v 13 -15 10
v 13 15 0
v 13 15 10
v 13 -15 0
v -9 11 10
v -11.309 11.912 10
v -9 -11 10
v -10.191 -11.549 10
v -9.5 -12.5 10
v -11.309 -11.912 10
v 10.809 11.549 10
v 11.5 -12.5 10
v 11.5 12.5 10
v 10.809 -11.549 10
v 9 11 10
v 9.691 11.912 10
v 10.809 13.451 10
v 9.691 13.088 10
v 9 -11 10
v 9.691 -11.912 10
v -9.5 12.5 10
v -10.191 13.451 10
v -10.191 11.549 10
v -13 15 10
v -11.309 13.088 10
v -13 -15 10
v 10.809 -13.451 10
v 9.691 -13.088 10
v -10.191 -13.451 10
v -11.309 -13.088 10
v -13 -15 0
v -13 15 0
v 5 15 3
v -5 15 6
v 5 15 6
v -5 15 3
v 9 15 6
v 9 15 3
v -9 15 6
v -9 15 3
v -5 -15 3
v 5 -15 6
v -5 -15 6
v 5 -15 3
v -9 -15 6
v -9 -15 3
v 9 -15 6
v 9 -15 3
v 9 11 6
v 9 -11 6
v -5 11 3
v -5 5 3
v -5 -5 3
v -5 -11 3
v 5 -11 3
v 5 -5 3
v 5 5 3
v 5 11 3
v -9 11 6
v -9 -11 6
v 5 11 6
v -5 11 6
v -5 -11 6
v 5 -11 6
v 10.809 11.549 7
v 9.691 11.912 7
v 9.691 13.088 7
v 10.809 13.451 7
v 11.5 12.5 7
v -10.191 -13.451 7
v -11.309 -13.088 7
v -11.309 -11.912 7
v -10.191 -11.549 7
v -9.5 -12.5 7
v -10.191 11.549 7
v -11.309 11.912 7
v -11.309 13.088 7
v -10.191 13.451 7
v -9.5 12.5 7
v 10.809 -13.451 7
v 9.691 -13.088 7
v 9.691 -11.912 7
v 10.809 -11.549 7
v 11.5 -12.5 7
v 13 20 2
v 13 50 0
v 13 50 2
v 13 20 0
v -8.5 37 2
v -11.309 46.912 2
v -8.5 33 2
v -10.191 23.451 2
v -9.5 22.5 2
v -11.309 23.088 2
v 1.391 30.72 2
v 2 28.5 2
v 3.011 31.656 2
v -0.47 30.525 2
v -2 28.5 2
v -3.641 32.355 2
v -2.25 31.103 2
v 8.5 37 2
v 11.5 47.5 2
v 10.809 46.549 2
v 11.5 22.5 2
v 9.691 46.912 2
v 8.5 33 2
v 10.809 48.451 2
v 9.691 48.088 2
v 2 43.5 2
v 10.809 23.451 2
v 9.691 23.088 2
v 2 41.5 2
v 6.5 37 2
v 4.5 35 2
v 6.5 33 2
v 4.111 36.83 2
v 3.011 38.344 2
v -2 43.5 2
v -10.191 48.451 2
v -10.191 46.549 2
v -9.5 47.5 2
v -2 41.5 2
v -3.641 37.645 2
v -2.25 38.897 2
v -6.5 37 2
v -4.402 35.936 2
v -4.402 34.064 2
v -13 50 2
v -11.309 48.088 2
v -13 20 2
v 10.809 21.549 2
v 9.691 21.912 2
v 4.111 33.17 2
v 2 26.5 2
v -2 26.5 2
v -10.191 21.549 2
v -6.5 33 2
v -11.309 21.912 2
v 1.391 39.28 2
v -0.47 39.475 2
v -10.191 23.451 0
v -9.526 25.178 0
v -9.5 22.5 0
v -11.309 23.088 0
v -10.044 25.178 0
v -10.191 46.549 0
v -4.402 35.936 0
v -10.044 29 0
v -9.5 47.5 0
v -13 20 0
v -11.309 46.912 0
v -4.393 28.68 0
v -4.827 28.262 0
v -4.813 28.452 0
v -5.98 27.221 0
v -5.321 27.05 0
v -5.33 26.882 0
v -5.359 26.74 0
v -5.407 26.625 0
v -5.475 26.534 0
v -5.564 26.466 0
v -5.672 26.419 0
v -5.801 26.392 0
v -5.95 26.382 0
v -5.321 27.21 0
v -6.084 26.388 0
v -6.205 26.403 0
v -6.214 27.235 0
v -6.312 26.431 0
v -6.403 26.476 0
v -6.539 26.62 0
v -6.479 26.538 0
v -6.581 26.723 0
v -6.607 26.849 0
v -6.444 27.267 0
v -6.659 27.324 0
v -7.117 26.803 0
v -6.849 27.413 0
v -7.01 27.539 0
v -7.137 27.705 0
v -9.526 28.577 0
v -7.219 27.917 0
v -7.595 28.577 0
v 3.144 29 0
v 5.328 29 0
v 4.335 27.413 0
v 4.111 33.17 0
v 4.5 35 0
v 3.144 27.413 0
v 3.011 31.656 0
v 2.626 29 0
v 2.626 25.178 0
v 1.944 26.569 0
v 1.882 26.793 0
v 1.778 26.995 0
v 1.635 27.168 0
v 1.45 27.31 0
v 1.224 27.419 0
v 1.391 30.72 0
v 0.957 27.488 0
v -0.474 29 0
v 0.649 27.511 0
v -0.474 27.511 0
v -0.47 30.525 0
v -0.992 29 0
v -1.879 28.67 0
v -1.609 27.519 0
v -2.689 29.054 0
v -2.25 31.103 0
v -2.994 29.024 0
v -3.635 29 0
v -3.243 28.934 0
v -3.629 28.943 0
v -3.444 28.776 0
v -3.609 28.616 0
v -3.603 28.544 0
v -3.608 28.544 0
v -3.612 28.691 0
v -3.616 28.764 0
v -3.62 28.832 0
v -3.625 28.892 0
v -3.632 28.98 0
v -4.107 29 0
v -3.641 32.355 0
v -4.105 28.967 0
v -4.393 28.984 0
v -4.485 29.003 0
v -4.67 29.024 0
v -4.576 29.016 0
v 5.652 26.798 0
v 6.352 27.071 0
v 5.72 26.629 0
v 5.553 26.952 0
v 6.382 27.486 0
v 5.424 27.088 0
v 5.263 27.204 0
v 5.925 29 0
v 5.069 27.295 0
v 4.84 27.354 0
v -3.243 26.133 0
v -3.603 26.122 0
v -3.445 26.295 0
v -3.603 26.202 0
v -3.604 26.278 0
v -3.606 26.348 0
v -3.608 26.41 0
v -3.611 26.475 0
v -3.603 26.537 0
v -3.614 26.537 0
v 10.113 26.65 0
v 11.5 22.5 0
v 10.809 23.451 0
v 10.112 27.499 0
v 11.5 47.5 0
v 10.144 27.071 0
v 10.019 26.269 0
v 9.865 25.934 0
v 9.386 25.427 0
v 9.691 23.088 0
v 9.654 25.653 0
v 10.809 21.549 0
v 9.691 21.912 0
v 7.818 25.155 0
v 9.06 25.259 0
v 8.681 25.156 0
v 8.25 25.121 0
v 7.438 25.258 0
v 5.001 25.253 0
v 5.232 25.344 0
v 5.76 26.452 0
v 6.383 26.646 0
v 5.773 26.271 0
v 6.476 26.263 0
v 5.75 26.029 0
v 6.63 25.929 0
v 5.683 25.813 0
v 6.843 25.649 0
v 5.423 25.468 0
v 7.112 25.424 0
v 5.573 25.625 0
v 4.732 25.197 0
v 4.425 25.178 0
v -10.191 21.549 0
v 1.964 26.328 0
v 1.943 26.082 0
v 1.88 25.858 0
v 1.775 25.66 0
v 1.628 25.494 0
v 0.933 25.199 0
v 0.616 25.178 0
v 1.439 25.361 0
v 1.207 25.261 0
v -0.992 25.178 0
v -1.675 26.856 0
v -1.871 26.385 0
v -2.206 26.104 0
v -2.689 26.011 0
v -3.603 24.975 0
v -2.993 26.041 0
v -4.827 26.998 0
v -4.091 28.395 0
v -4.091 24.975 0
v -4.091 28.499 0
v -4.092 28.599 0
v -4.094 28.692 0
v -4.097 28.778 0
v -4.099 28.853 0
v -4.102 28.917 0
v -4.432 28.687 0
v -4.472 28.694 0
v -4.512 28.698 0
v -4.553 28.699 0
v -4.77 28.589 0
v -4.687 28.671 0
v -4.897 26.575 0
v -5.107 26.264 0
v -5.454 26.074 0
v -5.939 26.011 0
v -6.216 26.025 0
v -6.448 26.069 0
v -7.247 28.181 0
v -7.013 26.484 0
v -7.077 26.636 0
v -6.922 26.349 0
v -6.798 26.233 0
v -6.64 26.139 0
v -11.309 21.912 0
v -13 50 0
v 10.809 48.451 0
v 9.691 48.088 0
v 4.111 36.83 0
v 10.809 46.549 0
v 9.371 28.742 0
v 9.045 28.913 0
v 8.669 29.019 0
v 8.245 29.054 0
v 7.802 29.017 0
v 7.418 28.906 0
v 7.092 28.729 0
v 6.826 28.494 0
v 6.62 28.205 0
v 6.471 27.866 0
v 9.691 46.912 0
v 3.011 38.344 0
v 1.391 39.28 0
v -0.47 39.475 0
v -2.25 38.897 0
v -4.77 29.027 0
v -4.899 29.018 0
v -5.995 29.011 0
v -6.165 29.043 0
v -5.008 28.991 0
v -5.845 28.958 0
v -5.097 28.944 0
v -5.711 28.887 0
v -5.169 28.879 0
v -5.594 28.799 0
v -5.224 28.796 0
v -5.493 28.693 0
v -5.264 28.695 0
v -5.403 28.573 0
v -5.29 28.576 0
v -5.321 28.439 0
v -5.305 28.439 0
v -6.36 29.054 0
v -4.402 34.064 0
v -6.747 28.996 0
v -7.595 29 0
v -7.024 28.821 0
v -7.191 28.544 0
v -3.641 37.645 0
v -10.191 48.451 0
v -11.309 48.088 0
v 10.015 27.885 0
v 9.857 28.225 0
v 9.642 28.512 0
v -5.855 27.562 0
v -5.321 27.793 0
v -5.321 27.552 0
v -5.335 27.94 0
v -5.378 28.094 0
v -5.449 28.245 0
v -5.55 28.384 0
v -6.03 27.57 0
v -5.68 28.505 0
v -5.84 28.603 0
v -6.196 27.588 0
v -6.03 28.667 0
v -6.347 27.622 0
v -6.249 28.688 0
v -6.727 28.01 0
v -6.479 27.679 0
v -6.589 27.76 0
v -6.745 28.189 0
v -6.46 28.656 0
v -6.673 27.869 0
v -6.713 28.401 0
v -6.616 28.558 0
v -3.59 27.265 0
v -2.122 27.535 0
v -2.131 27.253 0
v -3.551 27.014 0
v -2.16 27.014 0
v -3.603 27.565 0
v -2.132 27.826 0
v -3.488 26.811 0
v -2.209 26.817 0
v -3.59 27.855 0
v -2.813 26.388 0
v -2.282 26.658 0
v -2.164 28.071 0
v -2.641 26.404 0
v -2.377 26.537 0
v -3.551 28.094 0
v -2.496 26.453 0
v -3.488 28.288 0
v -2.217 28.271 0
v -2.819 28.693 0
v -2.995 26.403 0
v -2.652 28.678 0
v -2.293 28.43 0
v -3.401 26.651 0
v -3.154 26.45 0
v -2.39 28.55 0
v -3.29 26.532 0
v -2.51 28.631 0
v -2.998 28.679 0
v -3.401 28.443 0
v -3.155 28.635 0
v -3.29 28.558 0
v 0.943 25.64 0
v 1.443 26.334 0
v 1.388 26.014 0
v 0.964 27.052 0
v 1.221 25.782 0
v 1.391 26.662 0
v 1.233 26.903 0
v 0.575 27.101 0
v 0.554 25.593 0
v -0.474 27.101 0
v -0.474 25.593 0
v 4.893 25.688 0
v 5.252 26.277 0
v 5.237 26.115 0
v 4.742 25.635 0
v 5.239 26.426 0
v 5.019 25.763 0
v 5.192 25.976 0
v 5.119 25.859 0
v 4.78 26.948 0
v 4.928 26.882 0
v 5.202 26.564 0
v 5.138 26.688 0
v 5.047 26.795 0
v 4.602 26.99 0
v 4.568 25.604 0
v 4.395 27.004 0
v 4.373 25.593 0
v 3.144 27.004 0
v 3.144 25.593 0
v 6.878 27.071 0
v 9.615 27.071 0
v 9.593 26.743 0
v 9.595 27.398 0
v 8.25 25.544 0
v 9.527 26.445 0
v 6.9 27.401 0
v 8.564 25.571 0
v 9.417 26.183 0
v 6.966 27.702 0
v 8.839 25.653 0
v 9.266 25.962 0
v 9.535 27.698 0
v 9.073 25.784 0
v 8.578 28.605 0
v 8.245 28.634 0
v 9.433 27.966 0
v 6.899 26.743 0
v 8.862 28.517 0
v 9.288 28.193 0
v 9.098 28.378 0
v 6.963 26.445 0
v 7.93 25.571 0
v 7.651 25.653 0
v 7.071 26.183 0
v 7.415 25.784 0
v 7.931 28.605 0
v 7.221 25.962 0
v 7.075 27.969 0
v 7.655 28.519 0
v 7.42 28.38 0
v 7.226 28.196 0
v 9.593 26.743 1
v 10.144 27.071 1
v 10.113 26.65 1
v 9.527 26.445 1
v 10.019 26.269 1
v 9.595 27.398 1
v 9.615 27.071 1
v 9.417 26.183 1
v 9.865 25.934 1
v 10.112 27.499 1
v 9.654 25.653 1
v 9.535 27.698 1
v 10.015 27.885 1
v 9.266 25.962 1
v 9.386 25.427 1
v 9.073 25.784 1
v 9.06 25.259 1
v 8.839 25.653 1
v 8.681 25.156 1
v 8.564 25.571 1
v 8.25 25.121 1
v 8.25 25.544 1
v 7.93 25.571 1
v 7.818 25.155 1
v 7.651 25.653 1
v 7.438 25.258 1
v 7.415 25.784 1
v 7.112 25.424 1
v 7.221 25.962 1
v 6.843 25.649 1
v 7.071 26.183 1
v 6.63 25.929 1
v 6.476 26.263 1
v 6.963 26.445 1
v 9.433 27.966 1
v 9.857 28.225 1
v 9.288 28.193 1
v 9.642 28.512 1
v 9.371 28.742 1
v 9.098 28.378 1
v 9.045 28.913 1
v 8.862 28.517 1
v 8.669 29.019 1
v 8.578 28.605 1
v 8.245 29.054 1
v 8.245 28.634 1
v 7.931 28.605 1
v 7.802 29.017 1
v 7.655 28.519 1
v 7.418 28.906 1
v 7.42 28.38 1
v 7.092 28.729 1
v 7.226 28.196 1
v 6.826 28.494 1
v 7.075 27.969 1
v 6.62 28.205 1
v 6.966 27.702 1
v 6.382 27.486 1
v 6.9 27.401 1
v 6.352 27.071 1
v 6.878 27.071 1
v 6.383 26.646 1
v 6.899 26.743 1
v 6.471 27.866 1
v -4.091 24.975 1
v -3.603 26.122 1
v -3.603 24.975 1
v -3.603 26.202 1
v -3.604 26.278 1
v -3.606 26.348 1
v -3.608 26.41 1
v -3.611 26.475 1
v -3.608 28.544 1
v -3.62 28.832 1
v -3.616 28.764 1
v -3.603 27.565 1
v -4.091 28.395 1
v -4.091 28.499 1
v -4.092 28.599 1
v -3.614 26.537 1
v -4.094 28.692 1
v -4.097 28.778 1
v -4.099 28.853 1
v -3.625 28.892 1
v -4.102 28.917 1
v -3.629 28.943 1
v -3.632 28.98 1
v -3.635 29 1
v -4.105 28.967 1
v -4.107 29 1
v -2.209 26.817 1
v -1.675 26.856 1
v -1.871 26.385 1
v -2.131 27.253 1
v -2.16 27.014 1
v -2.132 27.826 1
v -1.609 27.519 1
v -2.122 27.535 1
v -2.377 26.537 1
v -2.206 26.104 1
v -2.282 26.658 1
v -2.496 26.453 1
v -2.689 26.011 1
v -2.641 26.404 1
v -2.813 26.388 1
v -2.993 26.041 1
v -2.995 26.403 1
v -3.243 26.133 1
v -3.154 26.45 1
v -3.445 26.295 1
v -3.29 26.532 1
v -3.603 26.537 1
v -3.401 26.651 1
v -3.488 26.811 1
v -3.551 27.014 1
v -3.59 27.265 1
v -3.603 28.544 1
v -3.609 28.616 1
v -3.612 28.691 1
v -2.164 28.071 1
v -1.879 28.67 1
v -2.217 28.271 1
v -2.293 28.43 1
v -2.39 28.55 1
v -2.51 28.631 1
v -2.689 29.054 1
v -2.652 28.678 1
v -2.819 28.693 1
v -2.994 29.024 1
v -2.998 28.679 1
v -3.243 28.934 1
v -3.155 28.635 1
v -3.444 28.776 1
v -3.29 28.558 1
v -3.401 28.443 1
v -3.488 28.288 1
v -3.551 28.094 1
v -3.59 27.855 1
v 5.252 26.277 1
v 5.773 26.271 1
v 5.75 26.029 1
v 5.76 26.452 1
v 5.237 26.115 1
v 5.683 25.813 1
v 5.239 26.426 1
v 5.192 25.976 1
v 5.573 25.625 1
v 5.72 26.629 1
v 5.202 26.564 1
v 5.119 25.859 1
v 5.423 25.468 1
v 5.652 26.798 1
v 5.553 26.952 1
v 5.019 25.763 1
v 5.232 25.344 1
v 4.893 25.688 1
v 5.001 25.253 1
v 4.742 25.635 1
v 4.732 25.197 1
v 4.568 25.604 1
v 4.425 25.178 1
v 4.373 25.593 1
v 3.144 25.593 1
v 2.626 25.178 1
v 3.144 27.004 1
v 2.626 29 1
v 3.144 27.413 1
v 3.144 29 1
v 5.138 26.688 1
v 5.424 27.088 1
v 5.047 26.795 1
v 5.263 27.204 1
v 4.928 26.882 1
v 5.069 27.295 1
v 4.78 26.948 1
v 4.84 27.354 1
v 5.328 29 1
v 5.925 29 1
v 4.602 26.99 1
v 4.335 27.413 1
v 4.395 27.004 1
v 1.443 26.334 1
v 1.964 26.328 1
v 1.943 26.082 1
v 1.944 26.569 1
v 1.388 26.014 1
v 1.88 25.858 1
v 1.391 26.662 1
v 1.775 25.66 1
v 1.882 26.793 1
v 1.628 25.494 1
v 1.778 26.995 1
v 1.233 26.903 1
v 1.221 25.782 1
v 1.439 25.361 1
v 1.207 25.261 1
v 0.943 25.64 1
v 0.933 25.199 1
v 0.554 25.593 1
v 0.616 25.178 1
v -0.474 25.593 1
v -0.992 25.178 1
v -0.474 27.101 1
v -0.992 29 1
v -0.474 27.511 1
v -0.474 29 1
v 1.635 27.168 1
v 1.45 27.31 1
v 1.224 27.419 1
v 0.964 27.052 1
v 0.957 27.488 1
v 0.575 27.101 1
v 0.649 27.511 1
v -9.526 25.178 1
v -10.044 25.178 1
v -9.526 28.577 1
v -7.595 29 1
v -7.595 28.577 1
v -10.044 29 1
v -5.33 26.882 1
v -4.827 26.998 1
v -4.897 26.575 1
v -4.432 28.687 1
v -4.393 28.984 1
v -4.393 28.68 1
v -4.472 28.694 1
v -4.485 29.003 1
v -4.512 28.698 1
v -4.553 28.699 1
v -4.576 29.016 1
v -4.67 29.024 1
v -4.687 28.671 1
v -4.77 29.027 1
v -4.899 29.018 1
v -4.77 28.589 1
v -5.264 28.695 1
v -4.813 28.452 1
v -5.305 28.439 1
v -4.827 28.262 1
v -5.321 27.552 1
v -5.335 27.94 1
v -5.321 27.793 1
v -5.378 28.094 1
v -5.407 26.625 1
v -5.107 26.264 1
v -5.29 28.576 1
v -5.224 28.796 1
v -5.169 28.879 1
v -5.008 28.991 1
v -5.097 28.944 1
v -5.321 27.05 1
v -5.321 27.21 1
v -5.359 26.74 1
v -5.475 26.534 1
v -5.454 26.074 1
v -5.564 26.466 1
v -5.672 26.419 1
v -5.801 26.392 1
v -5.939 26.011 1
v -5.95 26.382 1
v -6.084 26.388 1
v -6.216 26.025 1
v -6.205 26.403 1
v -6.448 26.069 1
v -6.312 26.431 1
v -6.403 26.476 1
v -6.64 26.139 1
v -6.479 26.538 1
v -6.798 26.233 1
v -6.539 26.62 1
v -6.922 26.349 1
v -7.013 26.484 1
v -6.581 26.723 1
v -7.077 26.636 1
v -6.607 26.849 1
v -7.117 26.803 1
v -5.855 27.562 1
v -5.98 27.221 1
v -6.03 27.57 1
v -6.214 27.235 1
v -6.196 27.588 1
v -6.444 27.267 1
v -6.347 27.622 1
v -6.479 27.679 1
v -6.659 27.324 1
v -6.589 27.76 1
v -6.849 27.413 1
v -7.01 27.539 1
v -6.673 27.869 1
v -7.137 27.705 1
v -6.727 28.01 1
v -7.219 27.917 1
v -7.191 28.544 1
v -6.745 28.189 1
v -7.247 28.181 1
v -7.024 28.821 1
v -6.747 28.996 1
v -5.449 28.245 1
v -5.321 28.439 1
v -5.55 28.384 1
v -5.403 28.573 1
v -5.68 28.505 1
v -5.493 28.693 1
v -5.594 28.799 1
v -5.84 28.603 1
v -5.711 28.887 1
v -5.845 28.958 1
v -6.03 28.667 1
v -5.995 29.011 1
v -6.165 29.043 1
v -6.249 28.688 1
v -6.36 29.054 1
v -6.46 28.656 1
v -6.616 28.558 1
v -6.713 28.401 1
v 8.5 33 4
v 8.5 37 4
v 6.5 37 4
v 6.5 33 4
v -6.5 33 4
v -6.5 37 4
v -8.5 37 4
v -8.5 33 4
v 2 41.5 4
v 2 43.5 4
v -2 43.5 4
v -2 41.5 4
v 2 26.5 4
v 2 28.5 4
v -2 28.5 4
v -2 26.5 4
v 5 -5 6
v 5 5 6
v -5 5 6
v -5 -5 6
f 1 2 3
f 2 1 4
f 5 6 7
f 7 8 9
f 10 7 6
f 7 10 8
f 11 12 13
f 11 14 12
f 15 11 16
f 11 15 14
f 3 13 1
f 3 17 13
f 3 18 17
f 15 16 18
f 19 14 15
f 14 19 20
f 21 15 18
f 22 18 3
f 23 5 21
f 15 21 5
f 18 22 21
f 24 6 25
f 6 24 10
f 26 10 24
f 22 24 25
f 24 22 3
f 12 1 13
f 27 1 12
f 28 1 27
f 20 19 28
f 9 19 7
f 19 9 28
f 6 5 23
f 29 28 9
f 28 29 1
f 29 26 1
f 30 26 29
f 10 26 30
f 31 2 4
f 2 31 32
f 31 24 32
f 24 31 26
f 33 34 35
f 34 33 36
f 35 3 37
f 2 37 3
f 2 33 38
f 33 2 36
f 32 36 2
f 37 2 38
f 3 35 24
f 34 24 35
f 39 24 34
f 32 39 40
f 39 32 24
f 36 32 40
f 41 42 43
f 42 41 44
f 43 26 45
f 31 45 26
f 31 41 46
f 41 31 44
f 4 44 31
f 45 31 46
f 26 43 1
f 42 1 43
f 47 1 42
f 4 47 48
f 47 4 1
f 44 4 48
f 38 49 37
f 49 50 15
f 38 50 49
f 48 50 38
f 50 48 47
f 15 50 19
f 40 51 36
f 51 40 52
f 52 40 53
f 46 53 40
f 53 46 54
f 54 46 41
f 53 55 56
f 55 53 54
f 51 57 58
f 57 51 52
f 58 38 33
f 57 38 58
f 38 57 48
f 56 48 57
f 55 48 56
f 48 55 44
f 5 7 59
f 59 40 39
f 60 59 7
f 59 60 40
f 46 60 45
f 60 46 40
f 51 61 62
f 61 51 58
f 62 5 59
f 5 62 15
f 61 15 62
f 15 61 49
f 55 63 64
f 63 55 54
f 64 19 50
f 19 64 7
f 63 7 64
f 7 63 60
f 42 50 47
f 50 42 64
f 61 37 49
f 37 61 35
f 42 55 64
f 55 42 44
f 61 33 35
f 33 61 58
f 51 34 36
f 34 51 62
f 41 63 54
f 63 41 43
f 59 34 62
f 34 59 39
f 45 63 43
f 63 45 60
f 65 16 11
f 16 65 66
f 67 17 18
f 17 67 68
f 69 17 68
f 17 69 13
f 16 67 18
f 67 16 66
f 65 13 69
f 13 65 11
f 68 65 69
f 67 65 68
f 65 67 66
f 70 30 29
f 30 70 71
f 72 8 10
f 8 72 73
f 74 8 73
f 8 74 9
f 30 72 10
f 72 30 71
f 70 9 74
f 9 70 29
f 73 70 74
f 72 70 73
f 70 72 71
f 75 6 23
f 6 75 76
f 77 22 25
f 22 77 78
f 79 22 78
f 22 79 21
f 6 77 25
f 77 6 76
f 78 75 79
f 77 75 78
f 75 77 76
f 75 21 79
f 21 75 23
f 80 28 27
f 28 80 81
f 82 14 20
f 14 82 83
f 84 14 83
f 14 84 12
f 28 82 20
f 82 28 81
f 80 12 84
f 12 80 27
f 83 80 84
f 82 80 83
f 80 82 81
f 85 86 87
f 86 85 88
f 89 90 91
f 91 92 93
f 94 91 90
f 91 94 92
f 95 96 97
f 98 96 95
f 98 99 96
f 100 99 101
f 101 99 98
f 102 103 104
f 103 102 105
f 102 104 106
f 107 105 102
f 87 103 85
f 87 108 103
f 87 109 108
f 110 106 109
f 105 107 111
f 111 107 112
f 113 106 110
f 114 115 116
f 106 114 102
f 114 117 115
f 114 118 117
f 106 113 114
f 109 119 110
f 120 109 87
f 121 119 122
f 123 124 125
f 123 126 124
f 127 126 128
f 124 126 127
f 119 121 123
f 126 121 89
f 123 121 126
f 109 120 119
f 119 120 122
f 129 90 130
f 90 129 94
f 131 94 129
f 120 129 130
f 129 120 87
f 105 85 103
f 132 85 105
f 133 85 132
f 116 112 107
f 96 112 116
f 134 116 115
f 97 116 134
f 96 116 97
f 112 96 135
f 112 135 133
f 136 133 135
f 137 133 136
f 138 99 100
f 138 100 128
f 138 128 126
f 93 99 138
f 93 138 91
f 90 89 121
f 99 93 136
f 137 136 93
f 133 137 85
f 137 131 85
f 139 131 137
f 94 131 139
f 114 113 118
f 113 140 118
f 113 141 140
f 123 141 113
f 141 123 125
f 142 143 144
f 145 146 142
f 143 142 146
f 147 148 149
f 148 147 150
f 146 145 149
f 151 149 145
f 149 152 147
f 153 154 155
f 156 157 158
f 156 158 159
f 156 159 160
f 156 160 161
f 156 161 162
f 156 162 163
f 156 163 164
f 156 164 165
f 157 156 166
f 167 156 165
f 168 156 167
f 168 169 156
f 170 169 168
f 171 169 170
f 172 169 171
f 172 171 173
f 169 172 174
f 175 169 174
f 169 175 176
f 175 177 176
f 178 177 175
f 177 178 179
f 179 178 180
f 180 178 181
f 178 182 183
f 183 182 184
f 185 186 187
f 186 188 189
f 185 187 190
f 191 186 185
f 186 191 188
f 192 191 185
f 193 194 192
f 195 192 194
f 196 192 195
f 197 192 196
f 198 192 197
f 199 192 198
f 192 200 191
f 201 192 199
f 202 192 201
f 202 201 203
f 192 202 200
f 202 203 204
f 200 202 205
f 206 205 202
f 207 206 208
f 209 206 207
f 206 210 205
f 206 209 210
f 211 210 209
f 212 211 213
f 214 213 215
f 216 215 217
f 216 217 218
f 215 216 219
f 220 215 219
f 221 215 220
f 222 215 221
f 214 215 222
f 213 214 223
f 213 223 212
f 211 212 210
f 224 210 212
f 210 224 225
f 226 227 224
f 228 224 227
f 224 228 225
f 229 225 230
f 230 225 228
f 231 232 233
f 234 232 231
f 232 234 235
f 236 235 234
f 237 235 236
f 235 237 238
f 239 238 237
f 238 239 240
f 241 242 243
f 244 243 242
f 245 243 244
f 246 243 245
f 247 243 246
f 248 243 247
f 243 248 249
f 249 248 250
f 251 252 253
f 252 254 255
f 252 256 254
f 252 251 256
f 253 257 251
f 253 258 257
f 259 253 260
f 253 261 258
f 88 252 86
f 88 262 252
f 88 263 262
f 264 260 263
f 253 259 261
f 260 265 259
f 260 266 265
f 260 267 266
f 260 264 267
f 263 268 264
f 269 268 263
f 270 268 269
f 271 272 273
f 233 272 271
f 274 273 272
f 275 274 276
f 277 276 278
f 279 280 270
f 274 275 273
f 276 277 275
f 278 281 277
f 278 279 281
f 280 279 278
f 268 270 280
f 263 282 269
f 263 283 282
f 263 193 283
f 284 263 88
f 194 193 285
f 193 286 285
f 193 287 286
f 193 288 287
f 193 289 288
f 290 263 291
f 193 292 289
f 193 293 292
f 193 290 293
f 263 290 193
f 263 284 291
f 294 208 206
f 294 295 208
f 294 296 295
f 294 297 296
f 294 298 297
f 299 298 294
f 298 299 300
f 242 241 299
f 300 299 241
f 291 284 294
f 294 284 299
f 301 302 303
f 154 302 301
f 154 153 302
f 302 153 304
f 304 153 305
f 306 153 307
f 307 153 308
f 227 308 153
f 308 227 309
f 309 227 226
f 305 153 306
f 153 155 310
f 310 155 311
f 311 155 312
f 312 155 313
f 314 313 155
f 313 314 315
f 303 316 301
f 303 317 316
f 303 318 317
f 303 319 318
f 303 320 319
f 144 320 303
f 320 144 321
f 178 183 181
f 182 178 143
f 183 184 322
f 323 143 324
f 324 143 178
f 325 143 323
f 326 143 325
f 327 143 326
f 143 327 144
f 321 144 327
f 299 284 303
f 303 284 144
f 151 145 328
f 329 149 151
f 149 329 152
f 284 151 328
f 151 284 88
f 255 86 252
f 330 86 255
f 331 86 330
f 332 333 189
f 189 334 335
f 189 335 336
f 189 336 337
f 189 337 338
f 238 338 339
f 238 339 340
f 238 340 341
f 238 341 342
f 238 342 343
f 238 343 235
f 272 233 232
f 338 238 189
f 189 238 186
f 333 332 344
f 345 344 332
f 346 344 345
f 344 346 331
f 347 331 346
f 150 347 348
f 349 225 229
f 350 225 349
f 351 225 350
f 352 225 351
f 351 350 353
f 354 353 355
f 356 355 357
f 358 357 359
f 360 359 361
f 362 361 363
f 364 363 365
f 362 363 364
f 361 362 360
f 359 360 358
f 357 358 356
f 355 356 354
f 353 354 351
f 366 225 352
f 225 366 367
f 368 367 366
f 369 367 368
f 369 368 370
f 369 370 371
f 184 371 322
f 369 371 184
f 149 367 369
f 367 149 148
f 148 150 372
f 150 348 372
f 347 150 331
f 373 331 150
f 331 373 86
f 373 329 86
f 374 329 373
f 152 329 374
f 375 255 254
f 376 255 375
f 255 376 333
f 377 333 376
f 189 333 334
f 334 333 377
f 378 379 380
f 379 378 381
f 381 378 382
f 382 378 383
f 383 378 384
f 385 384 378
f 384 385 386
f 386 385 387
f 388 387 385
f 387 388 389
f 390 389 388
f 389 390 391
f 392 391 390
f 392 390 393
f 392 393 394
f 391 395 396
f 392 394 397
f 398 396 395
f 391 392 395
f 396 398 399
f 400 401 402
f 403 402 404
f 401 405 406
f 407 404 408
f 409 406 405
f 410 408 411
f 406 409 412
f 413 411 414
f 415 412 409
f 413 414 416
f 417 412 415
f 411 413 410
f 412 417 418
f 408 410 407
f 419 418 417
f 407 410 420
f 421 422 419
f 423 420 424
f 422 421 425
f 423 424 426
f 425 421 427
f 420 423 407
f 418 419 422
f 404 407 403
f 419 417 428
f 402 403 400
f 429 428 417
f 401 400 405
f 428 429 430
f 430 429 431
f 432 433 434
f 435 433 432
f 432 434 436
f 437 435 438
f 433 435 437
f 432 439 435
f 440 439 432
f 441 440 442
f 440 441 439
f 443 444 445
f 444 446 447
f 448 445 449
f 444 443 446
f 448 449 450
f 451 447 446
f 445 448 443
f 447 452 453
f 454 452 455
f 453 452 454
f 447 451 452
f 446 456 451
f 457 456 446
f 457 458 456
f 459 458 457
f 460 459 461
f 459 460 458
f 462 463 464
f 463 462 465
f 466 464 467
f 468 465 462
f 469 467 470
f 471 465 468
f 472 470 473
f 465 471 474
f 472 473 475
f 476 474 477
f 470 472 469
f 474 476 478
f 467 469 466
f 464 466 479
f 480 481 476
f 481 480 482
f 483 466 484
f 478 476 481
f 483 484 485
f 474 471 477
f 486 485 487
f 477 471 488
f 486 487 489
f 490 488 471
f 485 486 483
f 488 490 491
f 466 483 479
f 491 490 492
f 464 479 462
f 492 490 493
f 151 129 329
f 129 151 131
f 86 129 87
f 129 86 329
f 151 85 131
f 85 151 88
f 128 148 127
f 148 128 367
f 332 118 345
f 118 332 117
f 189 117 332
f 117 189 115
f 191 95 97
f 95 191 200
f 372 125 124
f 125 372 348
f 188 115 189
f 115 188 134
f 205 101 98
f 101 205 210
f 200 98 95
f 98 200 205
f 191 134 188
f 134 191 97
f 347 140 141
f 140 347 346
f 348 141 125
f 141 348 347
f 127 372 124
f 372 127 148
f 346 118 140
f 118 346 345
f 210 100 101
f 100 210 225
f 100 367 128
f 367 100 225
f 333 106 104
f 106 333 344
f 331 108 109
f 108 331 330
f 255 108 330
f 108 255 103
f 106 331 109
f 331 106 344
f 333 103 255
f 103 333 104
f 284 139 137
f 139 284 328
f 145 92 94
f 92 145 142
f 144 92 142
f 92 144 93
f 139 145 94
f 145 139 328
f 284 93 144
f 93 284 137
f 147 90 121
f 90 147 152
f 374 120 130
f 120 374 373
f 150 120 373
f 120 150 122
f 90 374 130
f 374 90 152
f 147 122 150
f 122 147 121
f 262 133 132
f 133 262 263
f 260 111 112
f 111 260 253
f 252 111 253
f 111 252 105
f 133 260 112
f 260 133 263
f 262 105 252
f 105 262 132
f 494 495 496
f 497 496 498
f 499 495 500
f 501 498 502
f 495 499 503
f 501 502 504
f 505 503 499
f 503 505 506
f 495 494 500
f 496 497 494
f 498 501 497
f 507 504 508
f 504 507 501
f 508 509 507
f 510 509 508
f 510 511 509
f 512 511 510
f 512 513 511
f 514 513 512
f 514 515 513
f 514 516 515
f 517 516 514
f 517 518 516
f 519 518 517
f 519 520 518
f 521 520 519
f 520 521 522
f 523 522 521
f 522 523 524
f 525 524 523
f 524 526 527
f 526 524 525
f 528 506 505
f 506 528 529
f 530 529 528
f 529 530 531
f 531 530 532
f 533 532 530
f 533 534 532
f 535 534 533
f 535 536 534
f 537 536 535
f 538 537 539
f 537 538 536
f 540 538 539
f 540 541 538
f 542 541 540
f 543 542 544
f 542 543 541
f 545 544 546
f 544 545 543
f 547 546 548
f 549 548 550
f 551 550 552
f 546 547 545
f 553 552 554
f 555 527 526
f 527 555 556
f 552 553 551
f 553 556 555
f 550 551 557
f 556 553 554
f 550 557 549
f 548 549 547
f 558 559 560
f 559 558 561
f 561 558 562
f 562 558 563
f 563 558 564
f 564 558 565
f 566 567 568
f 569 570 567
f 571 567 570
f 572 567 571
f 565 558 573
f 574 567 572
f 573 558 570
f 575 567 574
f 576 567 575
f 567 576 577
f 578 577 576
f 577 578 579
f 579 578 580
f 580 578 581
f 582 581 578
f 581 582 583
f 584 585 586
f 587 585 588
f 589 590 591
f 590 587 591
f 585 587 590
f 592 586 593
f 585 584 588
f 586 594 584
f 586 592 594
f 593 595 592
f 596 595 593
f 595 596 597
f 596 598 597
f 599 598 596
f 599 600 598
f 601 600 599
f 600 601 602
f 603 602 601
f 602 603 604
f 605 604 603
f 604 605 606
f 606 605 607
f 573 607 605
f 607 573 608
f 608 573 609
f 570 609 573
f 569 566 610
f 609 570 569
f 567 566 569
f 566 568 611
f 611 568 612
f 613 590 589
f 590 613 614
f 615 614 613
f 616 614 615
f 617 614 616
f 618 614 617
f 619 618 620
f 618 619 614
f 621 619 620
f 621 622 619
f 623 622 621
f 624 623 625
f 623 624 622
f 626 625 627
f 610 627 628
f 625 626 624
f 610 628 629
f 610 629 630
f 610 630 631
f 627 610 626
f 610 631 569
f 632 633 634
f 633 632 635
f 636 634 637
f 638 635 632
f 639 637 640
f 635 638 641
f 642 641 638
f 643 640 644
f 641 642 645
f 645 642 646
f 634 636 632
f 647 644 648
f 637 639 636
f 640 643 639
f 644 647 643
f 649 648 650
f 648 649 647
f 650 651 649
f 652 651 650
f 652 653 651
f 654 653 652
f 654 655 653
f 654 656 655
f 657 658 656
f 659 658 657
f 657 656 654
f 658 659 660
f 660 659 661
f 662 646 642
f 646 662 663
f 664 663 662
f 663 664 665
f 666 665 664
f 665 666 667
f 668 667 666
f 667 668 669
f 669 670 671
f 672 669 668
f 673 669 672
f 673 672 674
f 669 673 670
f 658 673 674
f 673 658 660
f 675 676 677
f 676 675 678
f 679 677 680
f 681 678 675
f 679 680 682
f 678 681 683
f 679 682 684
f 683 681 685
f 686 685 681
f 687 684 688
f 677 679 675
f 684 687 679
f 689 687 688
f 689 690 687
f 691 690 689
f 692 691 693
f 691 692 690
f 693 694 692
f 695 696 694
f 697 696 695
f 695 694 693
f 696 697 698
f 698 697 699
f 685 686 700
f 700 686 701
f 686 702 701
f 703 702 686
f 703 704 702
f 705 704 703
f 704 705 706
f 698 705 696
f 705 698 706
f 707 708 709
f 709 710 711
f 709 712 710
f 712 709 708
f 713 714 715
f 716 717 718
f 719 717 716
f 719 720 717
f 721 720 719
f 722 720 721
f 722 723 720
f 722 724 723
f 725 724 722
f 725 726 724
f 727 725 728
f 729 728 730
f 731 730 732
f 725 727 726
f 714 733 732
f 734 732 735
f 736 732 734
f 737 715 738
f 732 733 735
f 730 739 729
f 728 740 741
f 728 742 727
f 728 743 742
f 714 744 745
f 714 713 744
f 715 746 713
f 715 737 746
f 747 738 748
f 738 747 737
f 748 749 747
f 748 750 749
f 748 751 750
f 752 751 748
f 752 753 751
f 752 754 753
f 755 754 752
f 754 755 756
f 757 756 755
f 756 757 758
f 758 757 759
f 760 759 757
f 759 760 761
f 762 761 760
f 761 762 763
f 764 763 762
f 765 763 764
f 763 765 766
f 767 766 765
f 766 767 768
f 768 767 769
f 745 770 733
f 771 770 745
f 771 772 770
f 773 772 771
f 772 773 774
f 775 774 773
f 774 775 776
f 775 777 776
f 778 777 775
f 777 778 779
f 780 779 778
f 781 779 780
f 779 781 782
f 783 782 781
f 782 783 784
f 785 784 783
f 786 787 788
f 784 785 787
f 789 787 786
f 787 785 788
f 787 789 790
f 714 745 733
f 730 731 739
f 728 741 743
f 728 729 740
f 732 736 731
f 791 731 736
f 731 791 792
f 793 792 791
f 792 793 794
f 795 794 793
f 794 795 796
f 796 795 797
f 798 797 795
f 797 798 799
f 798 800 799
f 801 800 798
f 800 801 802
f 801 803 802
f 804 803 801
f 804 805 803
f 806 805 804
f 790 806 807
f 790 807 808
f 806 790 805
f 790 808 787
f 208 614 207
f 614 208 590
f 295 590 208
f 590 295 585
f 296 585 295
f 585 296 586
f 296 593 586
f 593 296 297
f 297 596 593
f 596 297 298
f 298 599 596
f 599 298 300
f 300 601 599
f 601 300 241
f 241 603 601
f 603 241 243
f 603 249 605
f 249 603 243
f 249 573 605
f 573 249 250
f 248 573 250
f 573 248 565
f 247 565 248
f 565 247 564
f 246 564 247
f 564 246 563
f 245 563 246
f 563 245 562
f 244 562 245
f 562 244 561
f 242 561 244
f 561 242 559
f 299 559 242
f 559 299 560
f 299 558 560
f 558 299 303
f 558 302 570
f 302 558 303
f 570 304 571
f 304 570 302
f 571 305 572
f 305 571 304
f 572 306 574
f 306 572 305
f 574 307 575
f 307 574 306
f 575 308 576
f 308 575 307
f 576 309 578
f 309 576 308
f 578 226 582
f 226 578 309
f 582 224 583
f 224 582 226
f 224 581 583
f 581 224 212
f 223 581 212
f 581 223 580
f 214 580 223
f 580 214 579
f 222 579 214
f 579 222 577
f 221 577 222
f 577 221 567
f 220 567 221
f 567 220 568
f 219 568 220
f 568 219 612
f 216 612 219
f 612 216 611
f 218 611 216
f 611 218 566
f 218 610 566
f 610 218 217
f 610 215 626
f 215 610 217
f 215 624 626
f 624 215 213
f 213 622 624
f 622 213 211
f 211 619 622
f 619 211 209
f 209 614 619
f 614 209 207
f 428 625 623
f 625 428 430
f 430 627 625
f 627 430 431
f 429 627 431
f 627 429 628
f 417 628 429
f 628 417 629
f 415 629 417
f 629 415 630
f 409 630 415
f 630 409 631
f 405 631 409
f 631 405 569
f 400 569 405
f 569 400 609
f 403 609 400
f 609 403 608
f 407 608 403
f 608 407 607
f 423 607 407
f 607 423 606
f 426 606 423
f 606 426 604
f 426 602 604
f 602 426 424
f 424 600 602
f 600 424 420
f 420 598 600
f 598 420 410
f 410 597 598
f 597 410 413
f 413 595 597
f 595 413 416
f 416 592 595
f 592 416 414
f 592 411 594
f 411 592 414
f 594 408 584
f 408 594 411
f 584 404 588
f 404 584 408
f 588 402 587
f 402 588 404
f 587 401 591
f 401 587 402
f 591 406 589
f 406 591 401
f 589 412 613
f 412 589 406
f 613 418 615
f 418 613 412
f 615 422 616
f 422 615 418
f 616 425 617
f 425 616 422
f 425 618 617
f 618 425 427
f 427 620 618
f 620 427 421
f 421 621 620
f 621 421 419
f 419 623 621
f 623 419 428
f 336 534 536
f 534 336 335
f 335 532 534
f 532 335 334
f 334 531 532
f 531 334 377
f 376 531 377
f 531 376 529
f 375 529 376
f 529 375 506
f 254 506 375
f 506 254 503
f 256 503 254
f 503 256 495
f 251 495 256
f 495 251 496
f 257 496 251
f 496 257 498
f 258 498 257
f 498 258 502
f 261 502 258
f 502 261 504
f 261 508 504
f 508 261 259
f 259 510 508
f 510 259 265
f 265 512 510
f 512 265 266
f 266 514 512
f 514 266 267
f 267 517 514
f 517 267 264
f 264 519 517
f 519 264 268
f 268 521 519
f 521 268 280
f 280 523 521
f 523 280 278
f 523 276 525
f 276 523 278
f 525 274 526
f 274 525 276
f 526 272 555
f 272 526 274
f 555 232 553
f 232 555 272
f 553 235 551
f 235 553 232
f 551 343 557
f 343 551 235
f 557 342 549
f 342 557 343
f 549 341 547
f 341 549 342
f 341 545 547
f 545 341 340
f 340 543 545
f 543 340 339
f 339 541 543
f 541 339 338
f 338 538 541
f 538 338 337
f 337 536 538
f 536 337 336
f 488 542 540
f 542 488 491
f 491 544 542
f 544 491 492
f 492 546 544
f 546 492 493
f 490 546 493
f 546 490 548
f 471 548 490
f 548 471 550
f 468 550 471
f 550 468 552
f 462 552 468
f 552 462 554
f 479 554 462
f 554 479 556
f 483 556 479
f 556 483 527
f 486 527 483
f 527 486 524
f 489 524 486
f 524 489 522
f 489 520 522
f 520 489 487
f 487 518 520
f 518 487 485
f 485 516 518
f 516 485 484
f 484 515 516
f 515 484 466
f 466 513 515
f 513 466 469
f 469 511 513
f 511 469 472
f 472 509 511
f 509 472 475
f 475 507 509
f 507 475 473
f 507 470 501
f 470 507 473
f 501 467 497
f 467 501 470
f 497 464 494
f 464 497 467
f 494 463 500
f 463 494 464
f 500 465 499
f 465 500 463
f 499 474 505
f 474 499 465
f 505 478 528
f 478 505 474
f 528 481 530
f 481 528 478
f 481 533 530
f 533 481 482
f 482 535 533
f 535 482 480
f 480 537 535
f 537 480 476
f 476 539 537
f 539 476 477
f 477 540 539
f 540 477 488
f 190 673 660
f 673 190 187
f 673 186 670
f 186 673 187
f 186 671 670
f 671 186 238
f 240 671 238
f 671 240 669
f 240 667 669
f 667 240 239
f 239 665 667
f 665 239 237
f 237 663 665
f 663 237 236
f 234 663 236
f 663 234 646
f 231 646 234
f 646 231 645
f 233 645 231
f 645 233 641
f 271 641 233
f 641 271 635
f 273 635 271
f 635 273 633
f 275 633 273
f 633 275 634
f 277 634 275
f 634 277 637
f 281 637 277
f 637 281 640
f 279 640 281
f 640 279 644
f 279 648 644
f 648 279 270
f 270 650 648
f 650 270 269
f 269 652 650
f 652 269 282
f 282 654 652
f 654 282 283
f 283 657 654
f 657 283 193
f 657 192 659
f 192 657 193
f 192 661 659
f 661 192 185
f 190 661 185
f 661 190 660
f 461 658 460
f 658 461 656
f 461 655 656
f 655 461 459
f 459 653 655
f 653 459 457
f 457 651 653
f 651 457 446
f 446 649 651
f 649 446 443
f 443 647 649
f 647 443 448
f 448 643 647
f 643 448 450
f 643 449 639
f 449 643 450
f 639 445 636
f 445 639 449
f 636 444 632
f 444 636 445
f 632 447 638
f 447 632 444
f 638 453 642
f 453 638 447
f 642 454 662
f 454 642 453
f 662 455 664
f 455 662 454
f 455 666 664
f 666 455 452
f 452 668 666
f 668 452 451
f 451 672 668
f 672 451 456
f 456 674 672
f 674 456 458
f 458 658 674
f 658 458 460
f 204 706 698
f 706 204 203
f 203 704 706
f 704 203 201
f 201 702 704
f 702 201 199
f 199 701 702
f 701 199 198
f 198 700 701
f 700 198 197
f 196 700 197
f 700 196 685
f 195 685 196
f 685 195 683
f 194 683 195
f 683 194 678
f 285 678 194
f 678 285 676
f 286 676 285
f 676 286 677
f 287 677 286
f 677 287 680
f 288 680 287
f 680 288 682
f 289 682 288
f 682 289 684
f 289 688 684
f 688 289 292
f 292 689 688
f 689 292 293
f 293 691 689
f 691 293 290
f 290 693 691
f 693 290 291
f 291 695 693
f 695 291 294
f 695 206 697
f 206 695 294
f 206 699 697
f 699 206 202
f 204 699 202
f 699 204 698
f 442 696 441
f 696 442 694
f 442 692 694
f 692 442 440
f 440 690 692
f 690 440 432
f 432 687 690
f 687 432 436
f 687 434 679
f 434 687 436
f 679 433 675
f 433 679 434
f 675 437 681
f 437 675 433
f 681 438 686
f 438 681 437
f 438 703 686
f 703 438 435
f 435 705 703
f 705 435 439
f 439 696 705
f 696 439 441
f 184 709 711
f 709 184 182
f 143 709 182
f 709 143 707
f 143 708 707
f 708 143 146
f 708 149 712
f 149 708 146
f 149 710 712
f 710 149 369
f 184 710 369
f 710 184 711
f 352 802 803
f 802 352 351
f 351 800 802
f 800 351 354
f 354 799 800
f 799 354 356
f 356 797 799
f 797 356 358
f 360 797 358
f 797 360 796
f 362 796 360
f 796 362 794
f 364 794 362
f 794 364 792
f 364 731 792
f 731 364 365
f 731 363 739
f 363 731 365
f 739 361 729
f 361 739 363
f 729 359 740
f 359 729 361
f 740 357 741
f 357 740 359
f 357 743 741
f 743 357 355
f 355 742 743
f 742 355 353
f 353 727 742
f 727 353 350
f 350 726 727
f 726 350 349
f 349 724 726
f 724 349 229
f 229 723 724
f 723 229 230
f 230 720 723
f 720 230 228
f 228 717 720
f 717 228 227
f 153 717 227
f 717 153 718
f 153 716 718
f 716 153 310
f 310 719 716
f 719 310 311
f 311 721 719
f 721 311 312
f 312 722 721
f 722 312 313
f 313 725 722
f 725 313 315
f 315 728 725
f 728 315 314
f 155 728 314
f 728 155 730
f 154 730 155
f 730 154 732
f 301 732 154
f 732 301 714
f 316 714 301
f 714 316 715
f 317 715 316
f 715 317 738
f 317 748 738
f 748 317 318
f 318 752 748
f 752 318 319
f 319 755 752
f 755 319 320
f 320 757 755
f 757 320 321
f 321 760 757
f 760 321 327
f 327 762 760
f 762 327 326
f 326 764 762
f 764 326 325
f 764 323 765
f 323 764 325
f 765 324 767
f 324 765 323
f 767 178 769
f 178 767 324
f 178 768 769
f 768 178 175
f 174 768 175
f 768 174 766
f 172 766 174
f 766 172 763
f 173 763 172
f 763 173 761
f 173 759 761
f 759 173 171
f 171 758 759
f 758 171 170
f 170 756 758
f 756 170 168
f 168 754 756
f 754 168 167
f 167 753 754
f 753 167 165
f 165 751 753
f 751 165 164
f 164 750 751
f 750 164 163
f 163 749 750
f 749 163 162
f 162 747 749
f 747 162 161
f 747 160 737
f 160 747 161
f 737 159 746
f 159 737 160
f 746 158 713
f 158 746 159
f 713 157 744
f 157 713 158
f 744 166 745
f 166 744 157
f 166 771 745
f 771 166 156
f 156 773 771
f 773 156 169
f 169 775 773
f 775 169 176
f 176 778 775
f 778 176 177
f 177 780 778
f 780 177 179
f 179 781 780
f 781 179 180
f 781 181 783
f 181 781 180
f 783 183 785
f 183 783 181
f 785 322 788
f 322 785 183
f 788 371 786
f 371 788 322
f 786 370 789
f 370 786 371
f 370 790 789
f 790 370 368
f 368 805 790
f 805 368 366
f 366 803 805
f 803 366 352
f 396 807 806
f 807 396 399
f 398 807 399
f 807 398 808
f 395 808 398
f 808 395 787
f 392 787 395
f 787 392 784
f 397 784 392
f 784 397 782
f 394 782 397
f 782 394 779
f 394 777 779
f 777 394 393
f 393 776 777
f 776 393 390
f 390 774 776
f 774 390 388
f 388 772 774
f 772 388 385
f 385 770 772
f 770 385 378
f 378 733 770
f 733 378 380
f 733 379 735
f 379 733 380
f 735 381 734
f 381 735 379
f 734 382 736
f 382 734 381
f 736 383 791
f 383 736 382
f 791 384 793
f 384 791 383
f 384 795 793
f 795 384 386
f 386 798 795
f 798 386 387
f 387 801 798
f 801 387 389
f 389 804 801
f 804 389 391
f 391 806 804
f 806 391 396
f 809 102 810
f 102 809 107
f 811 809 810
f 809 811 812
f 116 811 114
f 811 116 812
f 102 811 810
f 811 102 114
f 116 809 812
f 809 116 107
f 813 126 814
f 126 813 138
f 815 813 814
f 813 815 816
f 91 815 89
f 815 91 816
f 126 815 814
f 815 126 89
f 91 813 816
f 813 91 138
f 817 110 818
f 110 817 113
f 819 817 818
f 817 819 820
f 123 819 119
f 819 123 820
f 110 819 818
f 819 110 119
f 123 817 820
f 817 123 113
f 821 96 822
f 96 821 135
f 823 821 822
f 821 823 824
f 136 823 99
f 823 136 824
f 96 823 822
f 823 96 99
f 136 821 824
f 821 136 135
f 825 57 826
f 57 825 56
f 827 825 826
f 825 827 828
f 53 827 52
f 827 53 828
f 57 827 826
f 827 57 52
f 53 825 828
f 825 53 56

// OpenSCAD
// Created by Wederson Silva - Feb 2019

// Variables

boxmainsize = [26,30,10];
boxhollow = [18,22,8];
buttonbase = [10,10,3];
clamphollow = [4,32,3];
cylinheigh = 6;
cylinradius = 1.5;
center = true;

boxcovermainsize = [26,30,2];

// ######################
//    BOX 
// ######################
translate([0,0,4.5])
  cube(buttonbase, center);
  
 difference(){
    translate([0,0,5])
      cube(boxmainsize, center);
    
    translate([0,0,7])  
      cube(boxhollow, center);    
  
   translate([5,-16,3])  
      cube(clamphollow);
  
   translate([-9,-16,3])  
      cube(clamphollow);
      
   translate([10.5,12.5,7])      
      cylinder(h=4, r=1);
   
   translate([-10.5,-12.5,7])      
      cylinder(h=4, r=1);
   
   translate([-10.5,12.5,7])      
      cylinder(h=4, r=1);
   
   translate([10.5,-12.5,7])      
      cylinder(h=4, r=1);        
}
    

// ######################
//    BOX COVER
// ######################
translate([0,35]){    
  
  difference(){
    translate([0,0,1])
    cube(boxcovermainsize,center);

    translate([0,0,-1])     
      cylinder(h=5, r=4.5);
    
    translate([10.5,12.5,-1])      
      cylinder(h=4, r=1);
   
   translate([-10.5,-12.5,-1])      
      cylinder(h=4, r=1);
   
   translate([-10.5,12.5,-1])      
      cylinder(h=4, r=1);
   
   translate([10.5,-12.5,-1])      
      cylinder(h=4, r=1);
    
    translate([-10.5,-6,1])
      rotate([180])
        linear_extrude(3){
        text("LabPRO", 4);
      }  
  }

translate([6.5,-2,2])
      cube([2,4,2]);

translate([-8.5,-2,2])
      cube([2,4,2]);

translate([-2,6.5,2])
      cube([4,2,2]);

translate([-2,-8.5,2])
      cube([4,2,2]);  
}

// ######################
//    DESIGNER CREDITS
// ######################

//translate([-7.5,6,1])
//  linear_extrude(3){
//    text("MAKER", 3);
//  }
        
//translate([-12,-9,1])
//  linear_extrude(3){
//    text("WEDERSON", 3);
//  }

//translate([-8,-13,2])
    //linear_extrude(1){
      //text("LABPRO", 3);
//}
